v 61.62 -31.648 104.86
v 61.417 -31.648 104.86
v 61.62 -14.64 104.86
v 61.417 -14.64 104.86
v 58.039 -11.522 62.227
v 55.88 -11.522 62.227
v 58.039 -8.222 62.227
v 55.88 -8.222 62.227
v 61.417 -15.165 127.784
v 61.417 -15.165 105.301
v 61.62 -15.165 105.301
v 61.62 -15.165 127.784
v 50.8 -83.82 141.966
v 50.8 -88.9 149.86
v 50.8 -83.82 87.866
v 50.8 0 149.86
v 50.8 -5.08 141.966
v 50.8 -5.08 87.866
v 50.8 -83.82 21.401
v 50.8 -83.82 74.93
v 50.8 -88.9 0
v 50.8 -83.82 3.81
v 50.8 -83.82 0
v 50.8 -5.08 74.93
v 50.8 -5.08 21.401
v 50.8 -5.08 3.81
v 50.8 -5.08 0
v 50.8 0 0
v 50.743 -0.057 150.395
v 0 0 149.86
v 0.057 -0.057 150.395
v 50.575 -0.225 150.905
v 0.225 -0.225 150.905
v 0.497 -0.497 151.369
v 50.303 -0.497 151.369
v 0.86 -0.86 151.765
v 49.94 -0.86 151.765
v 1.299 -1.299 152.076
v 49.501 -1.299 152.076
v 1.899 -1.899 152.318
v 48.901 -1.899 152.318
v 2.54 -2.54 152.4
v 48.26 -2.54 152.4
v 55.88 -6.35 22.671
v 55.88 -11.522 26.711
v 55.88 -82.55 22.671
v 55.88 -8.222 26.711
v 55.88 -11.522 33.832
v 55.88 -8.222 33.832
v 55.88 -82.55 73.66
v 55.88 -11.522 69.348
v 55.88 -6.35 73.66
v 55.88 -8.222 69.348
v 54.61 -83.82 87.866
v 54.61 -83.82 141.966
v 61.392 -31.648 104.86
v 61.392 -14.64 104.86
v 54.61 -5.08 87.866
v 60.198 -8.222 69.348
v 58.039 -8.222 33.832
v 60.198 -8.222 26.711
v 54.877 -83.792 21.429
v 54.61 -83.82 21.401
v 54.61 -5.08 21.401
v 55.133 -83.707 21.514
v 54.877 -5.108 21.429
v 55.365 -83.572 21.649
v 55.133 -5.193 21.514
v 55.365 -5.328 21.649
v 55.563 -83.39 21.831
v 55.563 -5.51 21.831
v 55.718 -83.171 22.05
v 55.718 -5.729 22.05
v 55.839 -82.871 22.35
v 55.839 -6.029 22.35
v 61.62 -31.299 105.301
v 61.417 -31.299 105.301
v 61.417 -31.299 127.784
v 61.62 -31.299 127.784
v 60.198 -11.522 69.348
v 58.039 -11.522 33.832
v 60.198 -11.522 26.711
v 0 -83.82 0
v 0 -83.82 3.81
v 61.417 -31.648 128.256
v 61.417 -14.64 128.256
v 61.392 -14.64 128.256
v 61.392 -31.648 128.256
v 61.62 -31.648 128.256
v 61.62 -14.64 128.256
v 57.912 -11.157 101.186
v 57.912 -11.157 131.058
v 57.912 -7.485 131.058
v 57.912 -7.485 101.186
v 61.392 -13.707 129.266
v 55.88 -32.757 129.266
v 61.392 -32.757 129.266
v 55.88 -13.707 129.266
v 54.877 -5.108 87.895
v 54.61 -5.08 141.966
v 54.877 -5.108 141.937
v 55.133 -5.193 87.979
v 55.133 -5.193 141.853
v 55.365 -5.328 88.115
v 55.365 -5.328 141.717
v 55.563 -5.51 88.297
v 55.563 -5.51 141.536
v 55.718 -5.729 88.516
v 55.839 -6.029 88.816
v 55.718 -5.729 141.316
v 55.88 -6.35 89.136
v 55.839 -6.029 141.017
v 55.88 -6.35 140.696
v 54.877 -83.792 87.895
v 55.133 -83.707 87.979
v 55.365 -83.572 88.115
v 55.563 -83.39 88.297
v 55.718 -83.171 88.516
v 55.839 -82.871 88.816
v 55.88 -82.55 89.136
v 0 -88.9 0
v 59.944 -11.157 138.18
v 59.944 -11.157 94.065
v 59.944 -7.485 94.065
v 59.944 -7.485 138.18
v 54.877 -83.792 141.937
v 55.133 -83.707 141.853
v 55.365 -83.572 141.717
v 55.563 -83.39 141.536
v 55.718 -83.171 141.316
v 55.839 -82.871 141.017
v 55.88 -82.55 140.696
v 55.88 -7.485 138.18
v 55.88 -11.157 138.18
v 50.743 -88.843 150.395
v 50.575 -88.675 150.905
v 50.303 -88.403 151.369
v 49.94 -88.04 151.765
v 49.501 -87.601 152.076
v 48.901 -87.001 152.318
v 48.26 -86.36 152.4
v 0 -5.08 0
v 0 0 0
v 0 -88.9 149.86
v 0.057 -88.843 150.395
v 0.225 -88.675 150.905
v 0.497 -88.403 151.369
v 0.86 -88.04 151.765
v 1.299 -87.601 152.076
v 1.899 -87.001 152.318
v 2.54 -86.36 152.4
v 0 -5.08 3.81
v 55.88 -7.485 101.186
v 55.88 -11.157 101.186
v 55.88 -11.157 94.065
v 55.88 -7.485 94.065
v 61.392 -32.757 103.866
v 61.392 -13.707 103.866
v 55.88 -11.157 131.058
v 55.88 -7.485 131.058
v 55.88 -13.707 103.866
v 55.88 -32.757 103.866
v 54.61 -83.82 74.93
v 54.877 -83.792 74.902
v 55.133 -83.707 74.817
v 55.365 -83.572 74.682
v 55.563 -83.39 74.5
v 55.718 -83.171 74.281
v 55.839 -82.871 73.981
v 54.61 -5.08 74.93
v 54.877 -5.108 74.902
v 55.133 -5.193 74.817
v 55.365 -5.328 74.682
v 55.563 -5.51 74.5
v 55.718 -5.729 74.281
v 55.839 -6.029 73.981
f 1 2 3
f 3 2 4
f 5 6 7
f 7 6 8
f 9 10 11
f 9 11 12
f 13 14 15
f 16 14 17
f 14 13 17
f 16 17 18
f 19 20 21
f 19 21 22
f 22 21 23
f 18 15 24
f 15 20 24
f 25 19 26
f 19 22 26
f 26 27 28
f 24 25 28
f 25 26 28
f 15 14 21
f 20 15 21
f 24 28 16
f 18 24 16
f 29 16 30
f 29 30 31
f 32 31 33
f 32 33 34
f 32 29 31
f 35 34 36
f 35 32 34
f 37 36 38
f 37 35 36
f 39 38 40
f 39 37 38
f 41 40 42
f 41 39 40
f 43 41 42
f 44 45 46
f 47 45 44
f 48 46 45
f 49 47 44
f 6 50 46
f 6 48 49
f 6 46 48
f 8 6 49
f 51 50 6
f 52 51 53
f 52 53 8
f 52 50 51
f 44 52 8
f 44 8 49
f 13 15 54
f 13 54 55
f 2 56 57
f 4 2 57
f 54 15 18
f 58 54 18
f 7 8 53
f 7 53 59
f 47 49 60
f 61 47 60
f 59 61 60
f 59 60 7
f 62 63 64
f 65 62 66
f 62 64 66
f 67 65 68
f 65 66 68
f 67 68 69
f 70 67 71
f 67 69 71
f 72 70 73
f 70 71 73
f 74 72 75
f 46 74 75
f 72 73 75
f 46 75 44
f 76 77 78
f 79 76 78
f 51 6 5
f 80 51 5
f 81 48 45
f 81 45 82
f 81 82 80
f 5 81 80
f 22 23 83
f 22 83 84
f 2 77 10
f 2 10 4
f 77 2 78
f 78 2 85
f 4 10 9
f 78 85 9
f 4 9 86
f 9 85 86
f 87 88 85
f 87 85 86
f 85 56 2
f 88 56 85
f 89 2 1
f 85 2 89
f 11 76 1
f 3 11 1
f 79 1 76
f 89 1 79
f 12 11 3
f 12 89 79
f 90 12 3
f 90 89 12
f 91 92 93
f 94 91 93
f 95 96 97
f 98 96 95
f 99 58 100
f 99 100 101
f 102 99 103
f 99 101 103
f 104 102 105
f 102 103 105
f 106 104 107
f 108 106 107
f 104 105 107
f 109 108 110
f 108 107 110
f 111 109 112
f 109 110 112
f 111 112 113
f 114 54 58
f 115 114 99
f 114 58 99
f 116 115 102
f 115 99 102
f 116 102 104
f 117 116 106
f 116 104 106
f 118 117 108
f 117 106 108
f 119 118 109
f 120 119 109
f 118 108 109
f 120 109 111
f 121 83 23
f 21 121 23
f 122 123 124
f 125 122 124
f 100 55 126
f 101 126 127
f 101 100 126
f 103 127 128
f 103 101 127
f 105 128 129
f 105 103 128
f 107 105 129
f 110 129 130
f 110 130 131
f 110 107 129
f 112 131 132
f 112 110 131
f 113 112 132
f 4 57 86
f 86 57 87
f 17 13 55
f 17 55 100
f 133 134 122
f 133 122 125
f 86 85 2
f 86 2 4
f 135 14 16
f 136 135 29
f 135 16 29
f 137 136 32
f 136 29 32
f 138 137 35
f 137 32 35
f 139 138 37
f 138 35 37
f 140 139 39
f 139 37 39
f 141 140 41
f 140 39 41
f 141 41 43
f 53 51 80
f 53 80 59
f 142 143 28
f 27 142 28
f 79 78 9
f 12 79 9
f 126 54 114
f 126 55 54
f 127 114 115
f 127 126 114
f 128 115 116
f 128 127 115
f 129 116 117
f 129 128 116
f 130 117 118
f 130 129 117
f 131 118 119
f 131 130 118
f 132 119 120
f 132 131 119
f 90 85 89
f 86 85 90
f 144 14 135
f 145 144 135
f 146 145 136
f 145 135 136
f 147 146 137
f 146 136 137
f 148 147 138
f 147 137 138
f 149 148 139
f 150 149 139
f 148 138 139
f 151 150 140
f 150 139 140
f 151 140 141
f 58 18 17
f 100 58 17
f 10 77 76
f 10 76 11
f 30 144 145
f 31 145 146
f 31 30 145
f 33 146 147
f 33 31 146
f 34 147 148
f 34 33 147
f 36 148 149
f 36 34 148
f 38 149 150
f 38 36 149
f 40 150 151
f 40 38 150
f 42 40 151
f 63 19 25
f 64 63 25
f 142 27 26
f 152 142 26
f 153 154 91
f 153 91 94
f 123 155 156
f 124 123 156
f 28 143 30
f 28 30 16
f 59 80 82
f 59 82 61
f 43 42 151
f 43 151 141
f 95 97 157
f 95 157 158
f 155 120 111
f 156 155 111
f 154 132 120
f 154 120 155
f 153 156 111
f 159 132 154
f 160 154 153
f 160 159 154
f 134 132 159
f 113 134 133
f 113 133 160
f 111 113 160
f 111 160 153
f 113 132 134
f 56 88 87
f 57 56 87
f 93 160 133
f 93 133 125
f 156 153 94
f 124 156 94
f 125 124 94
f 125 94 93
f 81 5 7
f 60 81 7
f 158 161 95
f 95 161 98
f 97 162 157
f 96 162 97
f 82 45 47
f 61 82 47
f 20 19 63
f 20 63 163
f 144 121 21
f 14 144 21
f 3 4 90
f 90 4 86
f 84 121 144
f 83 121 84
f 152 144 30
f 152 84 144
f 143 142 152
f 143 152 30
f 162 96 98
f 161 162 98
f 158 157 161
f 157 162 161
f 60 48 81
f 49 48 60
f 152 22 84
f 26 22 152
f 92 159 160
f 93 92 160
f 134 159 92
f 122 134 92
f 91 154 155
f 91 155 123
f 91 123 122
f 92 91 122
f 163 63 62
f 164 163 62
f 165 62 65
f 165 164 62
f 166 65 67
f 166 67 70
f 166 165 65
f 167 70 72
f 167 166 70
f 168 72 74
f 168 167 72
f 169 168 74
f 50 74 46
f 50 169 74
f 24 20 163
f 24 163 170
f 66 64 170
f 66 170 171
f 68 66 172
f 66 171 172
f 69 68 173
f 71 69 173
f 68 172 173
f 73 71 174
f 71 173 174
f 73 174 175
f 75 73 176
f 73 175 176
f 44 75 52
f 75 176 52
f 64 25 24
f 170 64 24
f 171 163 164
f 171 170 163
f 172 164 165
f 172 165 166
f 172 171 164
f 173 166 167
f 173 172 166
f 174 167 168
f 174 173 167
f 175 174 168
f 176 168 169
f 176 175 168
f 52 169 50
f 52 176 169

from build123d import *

# Parameters (mm, degrees)
F0_W      = 50.8
F0_H      = 88.9
F1_DEPTH  = 152.4
F2_R      = 2.54
F3_W      = 78.74
F3_H      = 54.0994407277
F3_H_2    = 53.5289765078
F4_DEPTH  = 5.08
F5_W      = 78.74
F5_H      = 3.81
F6_DEPTH  = 50.801
F7_W      = 19.05
F7_H      = 25.4
F8_DEPTH  = 3.81
F9_R      = 1.27
F10_W     = 3.6719054915
F10_H     = 7.1212798357
F10_H_2   = 7.121271
F11_DEPTH = 4.064
F12_W     = 2.032
F12_H     = 3.6719054915
F13_DEPTH = 29.9466
F14_W     = 3.3000995283
F14_H     = 7.121271
F15_DEPTH = 4.318
F16_W     = 2.159
F16_H     = 3.3000995283
F17_DEPTH = 28.702
F18_DEPTH = 1.7018
F19_W     = 17.0083576813
F19_H     = 23.3957841992
F20_DEPTH = 0.0254
F21_W     = 17.0083576813
F21_H     = 23.3957841992
F21_W_2   = 16.1336986348
F21_H_2   = 22.4836915731
F22_DEPTH = 0.2032


with BuildPart() as f1:
    # F0 (on Top) → F1 (new body)
    with BuildSketch(Plane.XY):
        with Locations((25.4, -44.45)):
            Rectangle(F0_W, F0_H)
    extrude(amount=F1_DEPTH)

    # F2
    f2_edges = [f1.edges().sort_by_distance(p)[0] for p in [
        (50.8, -44.45, 152.4),
        (25.4, -88.9, 152.4),
        (25.4, 0, 152.4),
        (0, -44.45, 152.4),
    ]]
    fillet(f2_edges, radius=F2_R)

    # F3 (on face) → F4 (join)
    with BuildSketch(Plane.YZ.offset(50.8)):
        with Locations((-44.45, 114.9161458015)):
            Rectangle(F3_W, F3_H)
        with Locations((-44.45, 48.1655117461)):
            Rectangle(F3_W, F3_H_2)
    extrude(amount=F4_DEPTH)

    # F5 (on face) → F6 (cut, through all)
    with BuildSketch(Plane.YZ.offset(50.8)):
        with Locations((-44.45, 1.905)):
            Rectangle(F5_W, F5_H)
    extrude(amount=-F6_DEPTH, mode=Mode.SUBTRACT)

    # F9
    f9_edges = [f1.edges().sort_by_distance(p)[0] for p in [
        (55.88, -44.45, 74.93),
        (55.88, -83.82, 48.165512),
        (55.88, -44.45, 21.401023),
        (55.88, -5.08, 48.165512),
        (55.88, -5.08, 114.916146),
        (55.88, -44.45, 87.866425),
        (55.88, -83.82, 114.916146),
        (55.88, -44.45, 141.965866),
    ]]
    fillet(f9_edges, radius=F9_R)

    # F10 (on face) → F11 (join)
    with BuildSketch(Plane.YZ.offset(55.88)):
        with Locations((-9.3209201004, 97.6251736283)):
            Rectangle(F10_W, F10_H)
        with Locations((-9.3209201004, 134.6189261008)):
            Rectangle(F10_W, F10_H_2)
    extrude(amount=F11_DEPTH)

    # F12 (on face) → F13 (join)
    with BuildSketch(Plane.XY.offset(101.1858135462)):
        with Locations((58.928, -9.3209201004)):
            Rectangle(F12_W, F12_H)
    extrude(amount=F13_DEPTH)

    # F14 (on face) → F15 (join)
    with BuildSketch(Plane.YZ.offset(55.88)):
        with Locations((-9.8717217334, 30.2711736936)):
            Rectangle(F14_W, F14_H)
        with Locations((-9.8717217334, 65.7874699682)):
            Rectangle(F14_W, F14_H)
    extrude(amount=F15_DEPTH)

    # F16 (on face) → F17 (join)
    with BuildSketch(Plane.XY.offset(33.8318091936)):
        with Locations((59.1185, -9.8717217334)):
            Rectangle(F16_W, F16_H)
    extrude(amount=F17_DEPTH)


with BuildPart() as f8:
    # F7 (on face) → F8 (new body)
    with BuildSketch(Plane.YZ.offset(55.88)):
        with Locations((-23.2323434122, 116.5658661654)):
            Rectangle(F7_W, F7_H)
    extrude(amount=F8_DEPTH)

    # F18 (add): faces of the model
    f18_faces = [f8.faces().sort_by_distance(p)[0] for p in [
        (59.69, -23.2323434122, 116.5658661654),
        (59.69, -23.2323434122, 116.5658661654),
        (59.69, -23.2323434122, 116.5658661654),
        (59.69, -23.2323434122, 116.5658661654),
    ]]
    extrude(f18_faces, amount=F18_DEPTH)


with BuildPart() as f20:
    # F19 (on face) → F20 (new body)
    with BuildSketch(Plane.YZ.offset(61.3918)):
        with Locations((-23.1437156908, 116.5577434003)):
            Rectangle(F19_W, F19_H)
    extrude(amount=F20_DEPTH)


with BuildPart() as f22:
    # F21 (on face) → F22 (new body)
    with BuildSketch(Plane.YZ.offset(61.4172)):
        with Locations((-23.1437156908, 116.5577434003)):
            Rectangle(F21_W, F21_H)
        with Locations((-23.232343141, 116.5423467755)):
            Rectangle(F21_W_2, F21_H_2, mode=Mode.SUBTRACT)
    extrude(amount=F22_DEPTH)


solid = Compound([f1.part, f8.part, f20.part, f22.part])
